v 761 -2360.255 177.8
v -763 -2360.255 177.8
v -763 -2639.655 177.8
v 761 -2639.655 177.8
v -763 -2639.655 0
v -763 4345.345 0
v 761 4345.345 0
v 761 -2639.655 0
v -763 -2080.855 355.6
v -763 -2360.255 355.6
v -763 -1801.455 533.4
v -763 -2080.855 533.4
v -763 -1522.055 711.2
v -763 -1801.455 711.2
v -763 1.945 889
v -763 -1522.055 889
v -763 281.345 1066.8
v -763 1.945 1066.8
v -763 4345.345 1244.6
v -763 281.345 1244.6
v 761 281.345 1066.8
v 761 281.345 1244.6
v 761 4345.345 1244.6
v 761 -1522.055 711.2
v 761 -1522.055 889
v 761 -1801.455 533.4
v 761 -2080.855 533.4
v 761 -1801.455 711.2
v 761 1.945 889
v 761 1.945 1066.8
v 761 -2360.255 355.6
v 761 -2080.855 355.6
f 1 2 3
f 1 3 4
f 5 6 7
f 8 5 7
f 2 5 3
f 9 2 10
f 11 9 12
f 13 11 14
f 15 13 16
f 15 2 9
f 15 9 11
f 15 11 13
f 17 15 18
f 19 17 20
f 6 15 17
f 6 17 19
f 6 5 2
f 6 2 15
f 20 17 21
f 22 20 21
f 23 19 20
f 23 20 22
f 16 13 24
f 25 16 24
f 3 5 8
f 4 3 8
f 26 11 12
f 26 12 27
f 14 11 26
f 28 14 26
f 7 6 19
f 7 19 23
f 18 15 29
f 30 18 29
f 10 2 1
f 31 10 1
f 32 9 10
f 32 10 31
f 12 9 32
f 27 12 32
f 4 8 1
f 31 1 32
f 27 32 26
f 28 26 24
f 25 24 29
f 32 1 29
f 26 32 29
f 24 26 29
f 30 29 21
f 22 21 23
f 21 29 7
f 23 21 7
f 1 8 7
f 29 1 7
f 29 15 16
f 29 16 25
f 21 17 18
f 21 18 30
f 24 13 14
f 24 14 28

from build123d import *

# Parameters (mm, degrees)
F0_W      = 1524
F0_H      = 6985
F1_DEPTH  = 177.8
F2_W      = 1524
F2_H      = 6705.6
F3_DEPTH  = 177.8
F4_W      = 1524
F4_H      = 6426.2
F5_DEPTH  = 177.8
F6_W      = 1524
F6_H      = 6146.8
F7_DEPTH  = 177.8
F8_W      = 1524
F8_H      = 5867.4
F9_DEPTH  = 177.8
F10_W     = 1524
F10_H     = 4343.4
F11_DEPTH = 177.8
F12_W     = 1524
F12_H     = 4064
F13_DEPTH = 177.8


with BuildPart() as f1:
    # F0 (on Top) → F1 (new body)
    with BuildSketch(Plane.XY):
        with Locations((-0.999503, 852.845111)):
            Rectangle(F0_W, F0_H)
    extrude(amount=F1_DEPTH)

    # F2 (on face) → F3 (join)
    with BuildSketch(Plane.XY.offset(177.8)):
        with Locations((-0.999503, 992.545111)):
            Rectangle(F2_W, F2_H)
    extrude(amount=F3_DEPTH)

    # F4 (on face) → F5 (join)
    with BuildSketch(Plane.XY.offset(355.6)):
        with Locations((-0.999503, 1132.245111)):
            Rectangle(F4_W, F4_H)
    extrude(amount=F5_DEPTH)

    # F6 (on face) → F7 (join)
    with BuildSketch(Plane.XY.offset(533.4)):
        with Locations((-0.999503, 1271.945111)):
            Rectangle(F6_W, F6_H)
    extrude(amount=F7_DEPTH)

    # F8 (on face) → F9 (join)
    with BuildSketch(Plane.XY.offset(711.2)):
        with Locations((-0.999503, 1411.645111)):
            Rectangle(F8_W, F8_H)
    extrude(amount=F9_DEPTH)

    # F10 (on face) → F11 (join)
    with BuildSketch(Plane.XY.offset(889)):
        with Locations((-0.999503, 2173.645111)):
            Rectangle(F10_W, F10_H)
    extrude(amount=F11_DEPTH)

    # F12 (on face) → F13 (join)
    with BuildSketch(Plane.XY.offset(1066.8)):
        with Locations((-0.999503, 2313.345111)):
            Rectangle(F12_W, F12_H)
    extrude(amount=F13_DEPTH)


solid = f1.part
